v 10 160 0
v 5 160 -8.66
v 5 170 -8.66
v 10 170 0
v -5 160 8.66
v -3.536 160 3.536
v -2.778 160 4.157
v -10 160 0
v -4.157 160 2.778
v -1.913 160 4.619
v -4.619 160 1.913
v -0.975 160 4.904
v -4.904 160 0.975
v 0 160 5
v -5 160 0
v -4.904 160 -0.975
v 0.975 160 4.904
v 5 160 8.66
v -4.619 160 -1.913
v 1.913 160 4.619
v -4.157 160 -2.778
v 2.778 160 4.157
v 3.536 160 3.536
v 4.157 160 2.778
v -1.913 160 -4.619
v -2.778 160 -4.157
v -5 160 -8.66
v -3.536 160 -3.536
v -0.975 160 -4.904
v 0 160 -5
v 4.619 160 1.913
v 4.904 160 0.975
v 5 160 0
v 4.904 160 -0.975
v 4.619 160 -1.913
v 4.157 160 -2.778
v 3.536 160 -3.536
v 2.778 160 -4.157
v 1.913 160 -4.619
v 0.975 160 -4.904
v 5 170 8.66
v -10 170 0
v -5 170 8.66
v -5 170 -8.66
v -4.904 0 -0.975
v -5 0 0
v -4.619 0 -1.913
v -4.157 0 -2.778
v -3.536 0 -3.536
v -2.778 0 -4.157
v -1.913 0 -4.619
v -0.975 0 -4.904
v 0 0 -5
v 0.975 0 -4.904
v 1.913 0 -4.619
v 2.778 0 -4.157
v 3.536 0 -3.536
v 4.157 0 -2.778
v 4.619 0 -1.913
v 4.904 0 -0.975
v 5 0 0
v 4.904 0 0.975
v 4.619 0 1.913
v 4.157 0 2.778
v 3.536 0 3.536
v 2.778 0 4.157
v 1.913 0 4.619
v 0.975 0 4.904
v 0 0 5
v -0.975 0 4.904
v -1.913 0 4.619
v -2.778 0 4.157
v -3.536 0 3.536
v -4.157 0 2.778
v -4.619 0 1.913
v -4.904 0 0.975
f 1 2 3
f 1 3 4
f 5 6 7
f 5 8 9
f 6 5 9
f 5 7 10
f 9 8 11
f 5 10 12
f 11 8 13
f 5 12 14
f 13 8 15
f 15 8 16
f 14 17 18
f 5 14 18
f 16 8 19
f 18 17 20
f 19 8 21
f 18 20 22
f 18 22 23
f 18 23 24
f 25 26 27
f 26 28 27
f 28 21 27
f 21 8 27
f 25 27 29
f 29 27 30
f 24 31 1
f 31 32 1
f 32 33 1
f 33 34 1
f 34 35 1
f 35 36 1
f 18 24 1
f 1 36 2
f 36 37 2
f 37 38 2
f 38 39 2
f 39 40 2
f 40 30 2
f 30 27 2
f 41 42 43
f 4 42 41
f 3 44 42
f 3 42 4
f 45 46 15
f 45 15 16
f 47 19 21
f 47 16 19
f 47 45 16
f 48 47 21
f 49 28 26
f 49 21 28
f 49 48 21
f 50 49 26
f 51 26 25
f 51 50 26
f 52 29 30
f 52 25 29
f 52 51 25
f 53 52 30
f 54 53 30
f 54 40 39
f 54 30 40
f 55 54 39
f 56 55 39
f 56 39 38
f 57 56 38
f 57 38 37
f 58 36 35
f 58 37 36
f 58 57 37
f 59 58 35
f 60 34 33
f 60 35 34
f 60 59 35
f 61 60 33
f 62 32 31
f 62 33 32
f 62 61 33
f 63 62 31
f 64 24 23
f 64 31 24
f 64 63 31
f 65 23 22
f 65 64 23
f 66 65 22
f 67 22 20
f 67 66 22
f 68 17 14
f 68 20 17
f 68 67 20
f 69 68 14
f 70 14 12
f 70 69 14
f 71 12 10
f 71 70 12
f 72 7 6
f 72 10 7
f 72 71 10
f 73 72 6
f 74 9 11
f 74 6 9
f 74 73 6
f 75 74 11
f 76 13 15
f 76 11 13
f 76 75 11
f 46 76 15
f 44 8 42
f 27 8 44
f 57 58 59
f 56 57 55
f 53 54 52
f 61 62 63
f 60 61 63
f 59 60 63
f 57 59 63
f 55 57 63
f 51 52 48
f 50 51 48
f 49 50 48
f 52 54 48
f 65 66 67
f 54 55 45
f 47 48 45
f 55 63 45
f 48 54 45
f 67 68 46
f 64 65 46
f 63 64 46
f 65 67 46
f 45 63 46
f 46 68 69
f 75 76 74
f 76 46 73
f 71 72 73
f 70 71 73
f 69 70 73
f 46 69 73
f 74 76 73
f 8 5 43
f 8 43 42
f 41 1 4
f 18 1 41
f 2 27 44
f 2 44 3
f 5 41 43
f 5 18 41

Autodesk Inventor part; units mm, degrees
ref_plane "YZ Plane" through (0, 0, 0) normal (1, 0, 0) x (0, 1, 0)
ref_plane "XZ Plane" through (0, 0, 0) normal (0, 1, 0) x (-1, 0, 0)
ref_plane "XY Plane" through (0, 0, 0) normal (0, 0, 1) x (1, 0, 0)
sketch "Sketch1" plane through (0, 0, 0) normal (0, 1, 0) x (-1, 0, 0)
  circle A0 centre (0, 0) radius 5
  dimension "d0" = 10
extrude "Extrusion1" add sketch "Sketch1" along normal blind 160
thread "Thread1" size "M10x1" class "6g" standard "ISO Metric profile" length 10
sketch "Sketch2" plane through (0, 160, 0) normal (0, 1, 0) x (1, 0, 0)
  circle A0 centre (0, 0) radius 5 projected
  circle A1 centre (0, 0) radius 10 construction
  line L0 (-10, 0) -> (-5, 8.6603)
  line L1 (-5, 8.6603) -> (5, 8.6603)
  line L2 (5, 8.6603) -> (10, 0)
  line L3 (10, 0) -> (5, -8.6603)
  line L4 (5, -8.6603) -> (-5, -8.6603)
  line L5 (-5, -8.6603) -> (-10, 0)
  dimension "d5" = 20
extrude "Extrusion2" add sketch "Sketch2" along normal blind 10 contours A0 | L0 L1 L2 L3 L4 L5
properties part number "BoltA" material "Titanium"
